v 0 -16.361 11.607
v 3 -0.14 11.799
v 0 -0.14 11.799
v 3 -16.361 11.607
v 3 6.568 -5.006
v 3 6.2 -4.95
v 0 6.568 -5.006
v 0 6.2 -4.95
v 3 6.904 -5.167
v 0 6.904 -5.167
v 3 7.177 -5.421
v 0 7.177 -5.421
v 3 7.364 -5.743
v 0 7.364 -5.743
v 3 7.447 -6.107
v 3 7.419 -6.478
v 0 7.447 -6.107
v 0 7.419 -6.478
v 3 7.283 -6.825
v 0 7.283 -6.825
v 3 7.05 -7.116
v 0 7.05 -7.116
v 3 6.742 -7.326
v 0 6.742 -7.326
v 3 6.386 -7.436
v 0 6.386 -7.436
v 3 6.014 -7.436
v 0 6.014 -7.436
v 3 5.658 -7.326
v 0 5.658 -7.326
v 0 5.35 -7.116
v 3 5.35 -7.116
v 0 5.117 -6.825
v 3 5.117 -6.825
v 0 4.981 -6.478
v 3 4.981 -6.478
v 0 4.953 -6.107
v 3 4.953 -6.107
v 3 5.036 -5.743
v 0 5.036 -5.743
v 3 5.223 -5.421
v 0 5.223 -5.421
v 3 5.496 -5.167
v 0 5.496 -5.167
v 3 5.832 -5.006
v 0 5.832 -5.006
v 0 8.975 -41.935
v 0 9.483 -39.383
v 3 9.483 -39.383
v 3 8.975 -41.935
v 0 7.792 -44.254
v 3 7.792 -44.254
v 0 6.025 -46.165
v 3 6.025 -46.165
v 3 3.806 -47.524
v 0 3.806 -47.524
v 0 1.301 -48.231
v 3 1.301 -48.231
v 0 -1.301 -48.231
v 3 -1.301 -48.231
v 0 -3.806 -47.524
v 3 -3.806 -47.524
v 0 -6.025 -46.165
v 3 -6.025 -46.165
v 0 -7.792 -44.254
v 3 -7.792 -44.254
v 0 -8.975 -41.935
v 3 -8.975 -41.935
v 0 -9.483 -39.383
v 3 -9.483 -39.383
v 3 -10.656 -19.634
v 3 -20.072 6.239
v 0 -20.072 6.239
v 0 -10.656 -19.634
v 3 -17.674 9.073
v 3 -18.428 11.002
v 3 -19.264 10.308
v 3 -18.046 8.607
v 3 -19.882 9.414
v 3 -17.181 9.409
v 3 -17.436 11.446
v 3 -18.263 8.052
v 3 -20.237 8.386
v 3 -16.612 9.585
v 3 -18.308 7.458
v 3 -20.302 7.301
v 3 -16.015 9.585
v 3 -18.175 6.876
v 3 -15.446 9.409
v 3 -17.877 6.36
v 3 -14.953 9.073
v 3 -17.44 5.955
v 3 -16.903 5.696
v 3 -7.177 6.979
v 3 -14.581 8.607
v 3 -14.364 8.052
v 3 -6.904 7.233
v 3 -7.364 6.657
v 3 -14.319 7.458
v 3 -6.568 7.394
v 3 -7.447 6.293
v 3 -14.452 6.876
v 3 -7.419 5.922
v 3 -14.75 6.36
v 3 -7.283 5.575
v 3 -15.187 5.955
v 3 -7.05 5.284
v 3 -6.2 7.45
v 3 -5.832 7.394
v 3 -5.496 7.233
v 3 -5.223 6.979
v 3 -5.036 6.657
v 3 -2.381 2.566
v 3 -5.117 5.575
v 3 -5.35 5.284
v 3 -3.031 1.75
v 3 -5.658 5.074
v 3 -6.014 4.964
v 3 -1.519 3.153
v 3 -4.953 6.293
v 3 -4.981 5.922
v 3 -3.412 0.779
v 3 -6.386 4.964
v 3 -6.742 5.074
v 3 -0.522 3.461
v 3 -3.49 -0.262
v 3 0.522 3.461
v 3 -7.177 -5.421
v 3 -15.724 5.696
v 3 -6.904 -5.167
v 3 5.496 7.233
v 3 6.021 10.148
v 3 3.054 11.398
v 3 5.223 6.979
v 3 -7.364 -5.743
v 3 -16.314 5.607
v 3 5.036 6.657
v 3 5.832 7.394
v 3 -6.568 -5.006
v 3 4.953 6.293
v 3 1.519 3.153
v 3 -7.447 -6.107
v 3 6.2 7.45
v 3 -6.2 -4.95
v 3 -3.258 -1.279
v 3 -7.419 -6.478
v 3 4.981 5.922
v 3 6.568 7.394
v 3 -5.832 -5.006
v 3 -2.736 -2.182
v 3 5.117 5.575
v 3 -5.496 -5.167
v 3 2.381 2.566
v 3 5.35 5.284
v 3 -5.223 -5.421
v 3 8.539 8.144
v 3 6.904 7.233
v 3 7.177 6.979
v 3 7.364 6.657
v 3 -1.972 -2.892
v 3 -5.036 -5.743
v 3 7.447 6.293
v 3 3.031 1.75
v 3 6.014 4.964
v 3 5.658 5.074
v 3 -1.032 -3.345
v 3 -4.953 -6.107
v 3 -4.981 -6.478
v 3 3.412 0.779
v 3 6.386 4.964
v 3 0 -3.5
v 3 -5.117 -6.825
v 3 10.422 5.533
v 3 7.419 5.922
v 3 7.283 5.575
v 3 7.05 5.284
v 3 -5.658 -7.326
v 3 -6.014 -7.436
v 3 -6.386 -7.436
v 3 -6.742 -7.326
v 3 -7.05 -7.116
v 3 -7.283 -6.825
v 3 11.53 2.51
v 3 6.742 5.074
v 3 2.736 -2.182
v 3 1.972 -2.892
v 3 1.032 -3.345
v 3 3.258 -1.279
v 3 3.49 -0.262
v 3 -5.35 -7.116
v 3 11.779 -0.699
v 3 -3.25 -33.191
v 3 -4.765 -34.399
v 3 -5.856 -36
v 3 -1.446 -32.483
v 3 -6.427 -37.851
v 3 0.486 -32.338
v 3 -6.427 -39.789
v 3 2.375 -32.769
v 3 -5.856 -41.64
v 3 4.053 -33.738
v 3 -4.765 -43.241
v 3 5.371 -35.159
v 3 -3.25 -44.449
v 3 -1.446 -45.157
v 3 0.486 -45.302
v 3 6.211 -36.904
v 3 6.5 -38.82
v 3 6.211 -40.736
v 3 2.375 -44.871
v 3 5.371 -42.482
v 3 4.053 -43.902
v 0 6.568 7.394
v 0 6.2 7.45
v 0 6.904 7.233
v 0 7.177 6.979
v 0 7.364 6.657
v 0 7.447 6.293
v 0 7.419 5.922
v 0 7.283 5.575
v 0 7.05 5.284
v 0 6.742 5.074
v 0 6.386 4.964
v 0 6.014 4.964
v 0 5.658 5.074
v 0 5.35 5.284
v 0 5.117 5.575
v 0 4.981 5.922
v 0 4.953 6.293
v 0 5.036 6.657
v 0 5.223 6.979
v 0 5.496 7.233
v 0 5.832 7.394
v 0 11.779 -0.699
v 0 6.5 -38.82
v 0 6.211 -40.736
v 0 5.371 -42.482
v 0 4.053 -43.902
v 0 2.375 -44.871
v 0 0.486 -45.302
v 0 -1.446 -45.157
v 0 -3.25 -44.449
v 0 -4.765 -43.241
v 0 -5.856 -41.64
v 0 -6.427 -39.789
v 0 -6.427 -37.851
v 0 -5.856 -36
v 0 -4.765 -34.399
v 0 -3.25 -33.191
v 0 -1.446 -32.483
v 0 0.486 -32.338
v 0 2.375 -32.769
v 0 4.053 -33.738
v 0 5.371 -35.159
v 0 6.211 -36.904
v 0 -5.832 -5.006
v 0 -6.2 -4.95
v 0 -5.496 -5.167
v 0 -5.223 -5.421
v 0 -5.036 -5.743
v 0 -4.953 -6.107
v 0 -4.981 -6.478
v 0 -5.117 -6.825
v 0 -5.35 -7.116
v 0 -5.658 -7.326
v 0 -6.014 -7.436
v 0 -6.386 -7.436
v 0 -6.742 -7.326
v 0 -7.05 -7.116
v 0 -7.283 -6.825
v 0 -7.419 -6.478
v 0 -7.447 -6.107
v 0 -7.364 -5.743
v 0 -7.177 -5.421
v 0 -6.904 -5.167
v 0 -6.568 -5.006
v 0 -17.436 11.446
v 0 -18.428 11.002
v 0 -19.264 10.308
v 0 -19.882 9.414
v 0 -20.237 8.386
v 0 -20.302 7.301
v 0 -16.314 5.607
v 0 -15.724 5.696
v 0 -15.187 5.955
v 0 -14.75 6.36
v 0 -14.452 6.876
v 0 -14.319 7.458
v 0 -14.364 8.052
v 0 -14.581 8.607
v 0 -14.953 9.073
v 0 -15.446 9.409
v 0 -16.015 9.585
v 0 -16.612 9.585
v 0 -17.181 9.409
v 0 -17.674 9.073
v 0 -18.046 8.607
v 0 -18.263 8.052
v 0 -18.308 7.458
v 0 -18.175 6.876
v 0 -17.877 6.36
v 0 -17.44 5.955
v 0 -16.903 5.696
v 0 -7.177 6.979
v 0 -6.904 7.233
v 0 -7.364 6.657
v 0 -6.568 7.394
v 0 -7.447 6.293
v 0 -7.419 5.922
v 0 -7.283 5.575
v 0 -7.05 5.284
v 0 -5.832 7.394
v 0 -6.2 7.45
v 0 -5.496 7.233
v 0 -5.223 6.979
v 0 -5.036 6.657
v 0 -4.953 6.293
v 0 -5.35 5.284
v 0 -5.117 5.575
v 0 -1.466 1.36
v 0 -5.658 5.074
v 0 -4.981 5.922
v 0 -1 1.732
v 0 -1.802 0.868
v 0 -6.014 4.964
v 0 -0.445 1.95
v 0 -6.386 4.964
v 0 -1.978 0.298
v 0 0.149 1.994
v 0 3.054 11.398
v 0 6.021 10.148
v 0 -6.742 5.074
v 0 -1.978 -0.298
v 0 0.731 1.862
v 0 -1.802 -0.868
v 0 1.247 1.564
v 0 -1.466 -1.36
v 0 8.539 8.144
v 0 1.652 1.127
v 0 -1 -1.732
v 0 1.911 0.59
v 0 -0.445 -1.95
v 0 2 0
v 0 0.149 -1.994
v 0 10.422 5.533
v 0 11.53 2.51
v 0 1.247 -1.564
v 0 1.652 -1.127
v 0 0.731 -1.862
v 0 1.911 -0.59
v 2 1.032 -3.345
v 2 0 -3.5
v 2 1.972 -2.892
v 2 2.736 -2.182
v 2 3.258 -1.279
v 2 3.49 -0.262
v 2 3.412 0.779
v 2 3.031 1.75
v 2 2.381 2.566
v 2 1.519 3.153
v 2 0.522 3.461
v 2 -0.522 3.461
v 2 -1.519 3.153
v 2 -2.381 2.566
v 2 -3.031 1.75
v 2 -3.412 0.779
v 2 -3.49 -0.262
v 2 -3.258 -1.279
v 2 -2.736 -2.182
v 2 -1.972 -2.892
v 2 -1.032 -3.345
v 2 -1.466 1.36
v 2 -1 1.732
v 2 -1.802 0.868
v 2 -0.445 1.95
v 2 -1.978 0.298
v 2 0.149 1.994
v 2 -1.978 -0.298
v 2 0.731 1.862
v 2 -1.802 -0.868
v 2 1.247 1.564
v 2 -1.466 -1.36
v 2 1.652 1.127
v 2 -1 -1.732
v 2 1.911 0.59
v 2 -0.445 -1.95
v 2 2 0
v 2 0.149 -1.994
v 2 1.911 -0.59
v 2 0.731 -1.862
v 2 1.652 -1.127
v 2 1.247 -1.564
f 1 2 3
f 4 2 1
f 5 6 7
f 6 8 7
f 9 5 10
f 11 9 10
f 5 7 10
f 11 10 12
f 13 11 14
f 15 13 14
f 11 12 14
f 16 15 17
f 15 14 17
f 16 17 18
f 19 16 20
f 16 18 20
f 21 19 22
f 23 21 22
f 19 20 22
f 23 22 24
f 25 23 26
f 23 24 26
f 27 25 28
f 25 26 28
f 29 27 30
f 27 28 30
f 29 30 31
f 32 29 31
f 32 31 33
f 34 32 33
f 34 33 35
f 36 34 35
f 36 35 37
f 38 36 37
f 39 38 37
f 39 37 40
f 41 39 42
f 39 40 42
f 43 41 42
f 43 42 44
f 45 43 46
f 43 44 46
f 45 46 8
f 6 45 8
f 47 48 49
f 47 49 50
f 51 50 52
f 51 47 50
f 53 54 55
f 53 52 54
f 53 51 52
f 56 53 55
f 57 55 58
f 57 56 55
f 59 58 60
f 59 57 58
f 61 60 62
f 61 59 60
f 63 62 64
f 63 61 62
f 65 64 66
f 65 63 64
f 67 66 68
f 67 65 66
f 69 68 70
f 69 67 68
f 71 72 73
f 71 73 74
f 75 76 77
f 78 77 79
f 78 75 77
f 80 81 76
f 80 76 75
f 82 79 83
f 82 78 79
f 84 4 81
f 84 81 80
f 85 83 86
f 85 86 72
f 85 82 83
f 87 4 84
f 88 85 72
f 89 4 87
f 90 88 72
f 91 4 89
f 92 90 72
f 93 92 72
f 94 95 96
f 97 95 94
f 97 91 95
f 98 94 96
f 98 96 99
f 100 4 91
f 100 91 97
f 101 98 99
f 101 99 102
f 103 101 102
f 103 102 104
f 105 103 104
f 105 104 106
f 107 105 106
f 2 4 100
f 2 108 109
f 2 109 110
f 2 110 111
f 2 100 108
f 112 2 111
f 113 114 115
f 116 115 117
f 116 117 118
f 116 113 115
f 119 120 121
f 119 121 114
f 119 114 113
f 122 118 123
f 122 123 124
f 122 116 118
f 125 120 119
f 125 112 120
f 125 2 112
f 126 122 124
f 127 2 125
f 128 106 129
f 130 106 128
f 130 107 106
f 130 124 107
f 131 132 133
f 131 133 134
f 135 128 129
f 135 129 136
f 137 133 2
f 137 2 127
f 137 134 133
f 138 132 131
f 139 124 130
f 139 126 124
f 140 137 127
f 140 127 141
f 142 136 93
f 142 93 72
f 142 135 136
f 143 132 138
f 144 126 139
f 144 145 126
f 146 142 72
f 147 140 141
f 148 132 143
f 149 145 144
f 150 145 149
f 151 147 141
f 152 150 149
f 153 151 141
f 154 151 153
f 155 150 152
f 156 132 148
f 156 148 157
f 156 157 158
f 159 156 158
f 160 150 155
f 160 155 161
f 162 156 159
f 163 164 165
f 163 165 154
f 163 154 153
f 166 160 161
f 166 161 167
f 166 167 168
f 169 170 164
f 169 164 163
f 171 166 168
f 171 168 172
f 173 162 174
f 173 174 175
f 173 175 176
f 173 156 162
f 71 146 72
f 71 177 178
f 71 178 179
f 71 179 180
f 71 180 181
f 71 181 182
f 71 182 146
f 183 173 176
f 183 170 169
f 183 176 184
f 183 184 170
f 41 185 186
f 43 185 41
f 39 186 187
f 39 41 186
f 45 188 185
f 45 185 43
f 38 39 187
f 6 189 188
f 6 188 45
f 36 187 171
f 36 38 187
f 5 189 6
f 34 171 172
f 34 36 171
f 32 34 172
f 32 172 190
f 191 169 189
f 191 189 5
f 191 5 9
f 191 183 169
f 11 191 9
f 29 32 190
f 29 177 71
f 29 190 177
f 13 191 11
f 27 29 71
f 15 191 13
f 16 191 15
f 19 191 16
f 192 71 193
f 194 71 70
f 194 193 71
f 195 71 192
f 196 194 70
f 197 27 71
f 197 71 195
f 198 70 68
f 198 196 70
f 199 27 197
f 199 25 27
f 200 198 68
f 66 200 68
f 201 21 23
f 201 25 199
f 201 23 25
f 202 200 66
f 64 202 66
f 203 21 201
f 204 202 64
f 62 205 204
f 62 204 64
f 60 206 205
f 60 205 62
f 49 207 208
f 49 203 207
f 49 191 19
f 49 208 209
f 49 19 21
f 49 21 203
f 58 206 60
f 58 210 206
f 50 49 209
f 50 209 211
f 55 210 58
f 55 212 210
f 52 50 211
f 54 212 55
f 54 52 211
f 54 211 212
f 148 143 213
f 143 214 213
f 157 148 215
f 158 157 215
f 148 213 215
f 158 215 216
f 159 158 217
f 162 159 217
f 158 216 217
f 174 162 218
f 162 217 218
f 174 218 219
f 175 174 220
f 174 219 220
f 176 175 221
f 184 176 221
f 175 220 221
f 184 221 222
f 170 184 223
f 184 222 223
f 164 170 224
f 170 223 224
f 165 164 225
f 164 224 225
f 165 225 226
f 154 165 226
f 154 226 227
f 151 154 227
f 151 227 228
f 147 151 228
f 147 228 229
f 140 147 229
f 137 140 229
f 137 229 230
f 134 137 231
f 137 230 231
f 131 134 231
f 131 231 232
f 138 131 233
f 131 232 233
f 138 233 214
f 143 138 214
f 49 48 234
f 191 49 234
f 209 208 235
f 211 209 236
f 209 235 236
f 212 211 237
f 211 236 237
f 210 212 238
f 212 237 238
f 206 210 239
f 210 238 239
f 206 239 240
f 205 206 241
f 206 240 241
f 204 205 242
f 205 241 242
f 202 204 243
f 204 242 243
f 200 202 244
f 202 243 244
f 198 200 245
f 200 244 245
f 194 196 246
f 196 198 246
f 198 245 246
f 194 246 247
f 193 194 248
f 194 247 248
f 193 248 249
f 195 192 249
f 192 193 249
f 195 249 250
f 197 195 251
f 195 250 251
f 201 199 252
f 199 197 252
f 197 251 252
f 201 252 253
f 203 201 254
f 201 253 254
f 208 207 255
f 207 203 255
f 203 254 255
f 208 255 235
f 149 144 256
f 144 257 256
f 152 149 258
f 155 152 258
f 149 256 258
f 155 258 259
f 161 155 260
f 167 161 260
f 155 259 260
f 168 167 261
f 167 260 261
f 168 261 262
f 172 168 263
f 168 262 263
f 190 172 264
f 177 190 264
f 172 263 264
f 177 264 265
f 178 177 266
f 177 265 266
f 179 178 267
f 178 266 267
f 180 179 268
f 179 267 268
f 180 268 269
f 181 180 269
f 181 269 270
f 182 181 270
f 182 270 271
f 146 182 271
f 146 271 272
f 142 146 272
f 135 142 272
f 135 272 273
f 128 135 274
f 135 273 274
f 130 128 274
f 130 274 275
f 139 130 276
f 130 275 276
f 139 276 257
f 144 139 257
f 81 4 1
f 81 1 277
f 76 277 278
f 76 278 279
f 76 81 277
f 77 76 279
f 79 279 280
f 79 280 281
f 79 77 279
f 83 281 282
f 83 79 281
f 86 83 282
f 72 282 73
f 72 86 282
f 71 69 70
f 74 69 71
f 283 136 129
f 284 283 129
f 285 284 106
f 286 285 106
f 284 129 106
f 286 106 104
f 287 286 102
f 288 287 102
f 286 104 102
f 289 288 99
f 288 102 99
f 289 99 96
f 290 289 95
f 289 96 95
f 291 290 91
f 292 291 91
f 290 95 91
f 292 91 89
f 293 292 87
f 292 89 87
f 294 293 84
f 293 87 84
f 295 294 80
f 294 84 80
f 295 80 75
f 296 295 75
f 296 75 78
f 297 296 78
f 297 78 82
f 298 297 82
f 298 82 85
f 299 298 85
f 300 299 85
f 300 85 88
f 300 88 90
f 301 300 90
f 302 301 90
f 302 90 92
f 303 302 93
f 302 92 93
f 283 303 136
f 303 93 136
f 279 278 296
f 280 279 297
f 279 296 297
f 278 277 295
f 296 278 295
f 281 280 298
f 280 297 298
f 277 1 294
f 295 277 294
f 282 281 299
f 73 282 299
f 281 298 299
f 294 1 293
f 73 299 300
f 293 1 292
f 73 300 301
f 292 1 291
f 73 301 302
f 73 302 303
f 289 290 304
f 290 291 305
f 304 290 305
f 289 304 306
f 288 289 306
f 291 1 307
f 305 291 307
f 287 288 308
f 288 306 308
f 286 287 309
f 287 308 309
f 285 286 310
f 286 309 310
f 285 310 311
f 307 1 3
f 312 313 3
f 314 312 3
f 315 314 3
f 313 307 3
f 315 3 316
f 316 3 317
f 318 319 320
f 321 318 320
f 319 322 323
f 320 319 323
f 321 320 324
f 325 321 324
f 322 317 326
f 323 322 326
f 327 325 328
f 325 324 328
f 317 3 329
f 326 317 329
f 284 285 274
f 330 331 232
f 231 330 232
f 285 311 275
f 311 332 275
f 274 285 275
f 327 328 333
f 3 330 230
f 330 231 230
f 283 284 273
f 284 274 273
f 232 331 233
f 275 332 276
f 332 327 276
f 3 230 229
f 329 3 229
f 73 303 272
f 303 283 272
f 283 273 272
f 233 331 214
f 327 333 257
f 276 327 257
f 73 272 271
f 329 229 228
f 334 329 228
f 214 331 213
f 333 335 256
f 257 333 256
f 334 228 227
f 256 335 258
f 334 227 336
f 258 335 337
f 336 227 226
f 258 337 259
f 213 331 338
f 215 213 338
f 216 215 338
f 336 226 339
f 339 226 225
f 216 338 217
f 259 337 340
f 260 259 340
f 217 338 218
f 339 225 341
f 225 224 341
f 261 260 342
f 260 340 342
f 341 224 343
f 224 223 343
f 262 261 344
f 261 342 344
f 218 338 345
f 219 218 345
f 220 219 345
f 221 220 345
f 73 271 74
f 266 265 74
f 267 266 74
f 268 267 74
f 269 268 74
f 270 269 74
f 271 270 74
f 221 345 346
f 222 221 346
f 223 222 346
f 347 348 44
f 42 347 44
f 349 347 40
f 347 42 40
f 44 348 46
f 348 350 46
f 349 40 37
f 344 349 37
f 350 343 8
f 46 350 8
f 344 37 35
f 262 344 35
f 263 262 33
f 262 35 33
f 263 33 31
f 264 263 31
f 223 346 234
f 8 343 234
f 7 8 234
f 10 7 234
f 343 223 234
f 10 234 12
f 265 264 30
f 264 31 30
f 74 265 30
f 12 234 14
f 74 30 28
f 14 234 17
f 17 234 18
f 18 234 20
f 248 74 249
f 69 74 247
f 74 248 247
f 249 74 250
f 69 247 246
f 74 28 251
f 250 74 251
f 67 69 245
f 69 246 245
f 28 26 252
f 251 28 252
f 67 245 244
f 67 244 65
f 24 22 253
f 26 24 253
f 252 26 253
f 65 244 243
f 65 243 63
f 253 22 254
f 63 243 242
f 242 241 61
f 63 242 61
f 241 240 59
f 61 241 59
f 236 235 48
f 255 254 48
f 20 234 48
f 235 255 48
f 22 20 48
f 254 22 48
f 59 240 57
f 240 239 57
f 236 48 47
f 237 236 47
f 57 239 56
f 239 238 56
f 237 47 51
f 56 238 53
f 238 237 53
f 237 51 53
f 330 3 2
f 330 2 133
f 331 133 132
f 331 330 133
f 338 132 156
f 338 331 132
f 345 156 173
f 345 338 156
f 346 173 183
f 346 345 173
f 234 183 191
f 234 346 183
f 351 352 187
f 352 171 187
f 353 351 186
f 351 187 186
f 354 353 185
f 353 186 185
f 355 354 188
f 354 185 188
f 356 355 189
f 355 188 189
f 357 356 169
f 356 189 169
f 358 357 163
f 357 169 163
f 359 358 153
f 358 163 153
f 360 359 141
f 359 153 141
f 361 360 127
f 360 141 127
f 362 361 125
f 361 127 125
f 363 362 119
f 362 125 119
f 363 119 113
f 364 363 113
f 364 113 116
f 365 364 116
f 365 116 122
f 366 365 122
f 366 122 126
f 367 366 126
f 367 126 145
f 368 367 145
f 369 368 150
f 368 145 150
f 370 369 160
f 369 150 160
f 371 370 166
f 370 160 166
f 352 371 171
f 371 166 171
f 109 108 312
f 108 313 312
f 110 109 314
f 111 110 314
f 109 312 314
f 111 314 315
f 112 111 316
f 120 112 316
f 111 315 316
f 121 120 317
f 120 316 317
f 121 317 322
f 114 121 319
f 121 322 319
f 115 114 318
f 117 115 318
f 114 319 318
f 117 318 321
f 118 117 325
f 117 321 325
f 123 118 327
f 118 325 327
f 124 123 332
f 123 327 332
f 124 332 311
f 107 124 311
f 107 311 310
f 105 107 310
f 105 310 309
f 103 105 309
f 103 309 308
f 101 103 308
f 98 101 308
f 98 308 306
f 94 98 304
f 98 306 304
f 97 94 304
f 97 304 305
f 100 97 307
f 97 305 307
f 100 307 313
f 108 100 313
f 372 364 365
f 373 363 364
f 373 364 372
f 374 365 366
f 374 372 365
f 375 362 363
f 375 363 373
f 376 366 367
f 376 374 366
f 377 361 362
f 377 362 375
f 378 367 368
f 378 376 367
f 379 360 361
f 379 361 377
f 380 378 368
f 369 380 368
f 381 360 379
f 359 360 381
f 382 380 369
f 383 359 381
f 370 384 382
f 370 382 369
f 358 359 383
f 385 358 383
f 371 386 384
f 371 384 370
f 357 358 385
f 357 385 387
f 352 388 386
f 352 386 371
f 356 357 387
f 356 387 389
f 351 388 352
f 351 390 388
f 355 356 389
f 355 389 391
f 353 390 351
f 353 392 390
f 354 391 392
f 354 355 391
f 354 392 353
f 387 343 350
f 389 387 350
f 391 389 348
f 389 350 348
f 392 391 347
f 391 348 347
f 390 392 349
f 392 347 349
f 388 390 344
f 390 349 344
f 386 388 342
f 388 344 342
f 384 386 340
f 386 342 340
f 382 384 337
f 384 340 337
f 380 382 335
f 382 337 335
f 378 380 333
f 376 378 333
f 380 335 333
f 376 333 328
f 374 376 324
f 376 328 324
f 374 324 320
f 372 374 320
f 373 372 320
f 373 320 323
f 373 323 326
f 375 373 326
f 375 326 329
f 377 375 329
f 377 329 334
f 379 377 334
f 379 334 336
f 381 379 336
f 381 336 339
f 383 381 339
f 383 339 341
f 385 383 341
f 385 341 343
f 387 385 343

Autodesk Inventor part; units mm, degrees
ref_plane "YZ Plane" through (0, 0, 0) normal (1, 0, 0) x (0, 1, 0)
ref_plane "XZ Plane" through (0, 0, 0) normal (0, 1, 0) x (-1, 0, 0)
ref_plane "XY Plane" through (0, 0, 0) normal (0, 0, 1) x (1, 0, 0)
sketch "Эскиз1" plane through (0, 0, 0) normal (1, 0, 0) x (0, 1, 0)
  circle A0 centre (35.2311, -22.6062) radius 9.3
  circle A1 centre (0, -38.8201) radius 6.1
  circle A2 centre (0, 0) radius 4.85
  circle A3 centre (35.8147, -49.5529) radius 3.55
  line L0 (6.0968, -38.6237) -> (4.8475, 0.1562)
  line L1 (-4.8475, 0.1562) -> (-6.0968, -38.6237)
  line L2 (0, 0) -> (0, -38.8201) construction
  circle A4 centre (0, -38.8201) radius 6.5
  circle A5 centre (0, 0) radius 2
  circle A6 centre (0, -38.8201) radius 15 construction
  circle A7 centre (0, 0) radius 14 construction
  circle A8 centre (0, -38.8201) radius 9.5
  circle A9 centre (0, 0) radius 7
  line L3 (9.4833, -39.383) -> (11.7793, -0.6991)
  line L4 (-9.4833, -39.383) -> (-11.7793, -0.6991)
  circle A10 centre (0, 0) radius 8.8
  circle A11 centre (0, 0) radius 11.8
  point P0 (-7, 0)
  point P1 (-9.4833, -39.383)
  point P2 (-11.7793, -0.6991)
  dimension "d27" = 19
  dimension "d0" = 18.6
  dimension "d1" = 12.2
  dimension "d2" = 9.7
  dimension "d3" = 7.1
  dimension "d8" = 38.8201
  dimension "d13" = 38.8
  dimension "d14" = 38.8
  dimension "d23" = 13
  dimension "d24" = 4
  dimension "d25" = 30
  dimension "d26" = 28
  dimension "d28" = 14
  dimension "d31" = 17.6
  dimension "d32" = 3
extrude "Выдавливание4" add sketch "Эскиз1" along normal blind 3 contours A4 L1 A8 L0 | L0 A8 L1 A4 | A8 L1 A11 L0 | L0 A11 L3 A8 | A8 L4 A11 L1 | A11 L1 A10 L0 | L0 A10 L1 A11 | A10 L1 A9 L0 | L0 A9 L1 A10 | A9 L1 A2 L0 | L0 A2 L1 A9 | A2
sketch "Эскиз4" plane through (0, 0, 0) normal (-1, 0, 0) x (0, 0, 1)
  circle A0 centre (-6.2, 6.2) radius 1.25
  circle A1 centre (0, 0) radius 2 construction
  circle A2 centre (-38.8201, 0) radius 6.5 construction
  arc A3 (-0.6991, -11.7793) -> (-0.6991, 11.7793) centre (0, 0) ccw construction
  line L0 (-39.383, 9.4833) -> (-0.6991, 11.7793) construction
  arc A4 (-39.383, 9.4833) -> (-39.383, -9.4833) centre (-38.8201, 0) ccw construction
  line L1 (-0.6991, -11.7793) -> (-39.383, -9.4833) construction
  line L2 (0, 0) -> (0, 11.8) construction
  arc A5 (-0.6991, -11.7793) -> (-0.6991, 11.7793) centre (0, 0) ccw construction
  line L3 (0, 0) -> (11.8, 0) construction
  circle A6 centre (6.2, 6.2) radius 1.25
  circle A7 centre (-6.2, -6.2) radius 1.25
  circle A8 centre (6.2, -6.2) radius 1.25
  dimension "d33" = 2.5
  dimension "d34" = 12.4
  dimension "d35" = 12.4
extrude "Выдавливание5" cut sketch "Эскиз4" against normal blind 3
sketch "Эскиз5" plane through (3, 0, 0) normal (1, 0, 0) x (0, 0, -1)
  circle A0 centre (0, 0) radius 3.5
  dimension "d38" = 7
extrude "Выдавливание6" cut sketch "Эскиз5" against normal blind 1
sketch "Эскиз6" plane through (3, 0, 0) normal (1, 0, 0) x (0, 0, -1)
  circle A0 centre (0, -18) radius 2
  circle A1 centre (0, 0) radius 3.5 construction
  circle A2 centre (-6.2, -6.2) radius 1.25 construction
  circle A3 centre (-6.2, 6.2) radius 1.25 construction
  circle A4 centre (6.2, -6.2) radius 1.25 construction
  circle A5 centre (6.2, 6.2) radius 1.25 construction
  circle A6 centre (38.8201, 0) radius 6.5 construction
  line L0 (39.383, 9.4833) -> (0.6991, 11.7793) construction
  arc A7 (0.6991, 11.7793) -> (0.6991, -11.7793) centre (0, 0) ccw construction
  line L1 (0.6991, -11.7793) -> (39.383, -9.4833) construction
  arc A8 (39.383, -9.4833) -> (39.383, 9.4833) centre (38.8201, 0) ccw construction
  line L2 (0, 0) -> (0, -26.6004) construction
  circle A9 centre (0, 0) radius 14 construction
  line L3 (-10.6346, -5.1133) -> (-3.6049, -19.7333)
  arc A10 (0, -14) -> (-3.6049, -19.7333) centre (0, -18) ccw construction
  line L4 (2.8284, -20.8284) -> (12.5829, -11.0739)
  line L5 (0.6991, -11.7793) -> (39.383, -9.4833) construction
  arc A11 (2.8284, -20.8284) -> (0, -14) centre (0, -18) ccw construction
  arc A12 (-3.6049, -19.7333) -> (2.8284, -20.8284) centre (0, -18) ccw
  line L6 (-10.6346, -5.1133) -> (-9.9206, -5.1133)
  line L7 (-9.9206, -5.1133) -> (-6.5876, -8.9793)
  line L8 (-6.5876, -8.9793) -> (5.3497, -10.0676)
  line L9 (5.3497, -10.0676) -> (12.5829, -11.0739)
  dimension "d42" = 28
  dimension "d41" = 4
  dimension "d43" = 18
  dimension "d44" = 8
  dimension "d45" = 45
extrude "Выдавливание7" [suppressed]
sketch "Эскиз7" plane through (3, 0, 0) normal (1, 0, 0) x (0, 0, -1)
  line L0 (0, 0) -> (0, -29.4139) construction
  circle A0 centre (-7.6071, -16.3135) radius 2
  line L1 (-7.6071, -16.3135) -> (0, 0) construction
  circle A1 centre (0, 0) radius 14 construction
  circle A2 centre (0, 0) radius 18 construction
  arc A3 (-6.239, -20.0723) -> (-11.6068, -16.361) centre (-7.6071, -16.3135) ccw construction
  circle A4 centre (0, 0) radius 3.5 construction
  circle A5 centre (-6.2, -6.2) radius 1.25 construction
  circle A6 centre (-6.2, 6.2) radius 1.25 construction
  circle A7 centre (6.2, -6.2) radius 1.25 construction
  circle A8 centre (6.2, 6.2) radius 1.25 construction
  circle A9 centre (38.8201, 0) radius 6.5 construction
  line L2 (39.383, 9.4833) -> (0.6991, 11.7793) construction
  arc A10 (0.6991, 11.7793) -> (0.6991, -11.7793) centre (0, 0) ccw projected
  line L3 (0.6991, -11.7793) -> (39.383, -9.4833) projected
  arc A11 (39.383, -9.4833) -> (39.383, 9.4833) centre (38.8201, 0) ccw construction
  line L4 (-11.7992, -0.1399) -> (-11.6068, -16.361)
  line L5 (-6.239, -20.0723) -> (19.6335, -10.6555)
  line L6 (0.6991, -11.7793) -> (39.383, -9.4833) construction
  arc A12 (-11.6068, -16.361) -> (-6.239, -20.0723) centre (-7.6071, -16.3135) ccw
  point P0 (19.6335, -10.6555)
  dimension "d48" = 4
  dimension "d50" = 28
  dimension "d52" = 8
  dimension "d53" = 45
  dimension "d56" = 25
  dimension "d57" = 4
extrude "Выдавливание8" add sketch "Эскиз7" against normal up to surface (3 mm away)
properties part number "right_wall"
